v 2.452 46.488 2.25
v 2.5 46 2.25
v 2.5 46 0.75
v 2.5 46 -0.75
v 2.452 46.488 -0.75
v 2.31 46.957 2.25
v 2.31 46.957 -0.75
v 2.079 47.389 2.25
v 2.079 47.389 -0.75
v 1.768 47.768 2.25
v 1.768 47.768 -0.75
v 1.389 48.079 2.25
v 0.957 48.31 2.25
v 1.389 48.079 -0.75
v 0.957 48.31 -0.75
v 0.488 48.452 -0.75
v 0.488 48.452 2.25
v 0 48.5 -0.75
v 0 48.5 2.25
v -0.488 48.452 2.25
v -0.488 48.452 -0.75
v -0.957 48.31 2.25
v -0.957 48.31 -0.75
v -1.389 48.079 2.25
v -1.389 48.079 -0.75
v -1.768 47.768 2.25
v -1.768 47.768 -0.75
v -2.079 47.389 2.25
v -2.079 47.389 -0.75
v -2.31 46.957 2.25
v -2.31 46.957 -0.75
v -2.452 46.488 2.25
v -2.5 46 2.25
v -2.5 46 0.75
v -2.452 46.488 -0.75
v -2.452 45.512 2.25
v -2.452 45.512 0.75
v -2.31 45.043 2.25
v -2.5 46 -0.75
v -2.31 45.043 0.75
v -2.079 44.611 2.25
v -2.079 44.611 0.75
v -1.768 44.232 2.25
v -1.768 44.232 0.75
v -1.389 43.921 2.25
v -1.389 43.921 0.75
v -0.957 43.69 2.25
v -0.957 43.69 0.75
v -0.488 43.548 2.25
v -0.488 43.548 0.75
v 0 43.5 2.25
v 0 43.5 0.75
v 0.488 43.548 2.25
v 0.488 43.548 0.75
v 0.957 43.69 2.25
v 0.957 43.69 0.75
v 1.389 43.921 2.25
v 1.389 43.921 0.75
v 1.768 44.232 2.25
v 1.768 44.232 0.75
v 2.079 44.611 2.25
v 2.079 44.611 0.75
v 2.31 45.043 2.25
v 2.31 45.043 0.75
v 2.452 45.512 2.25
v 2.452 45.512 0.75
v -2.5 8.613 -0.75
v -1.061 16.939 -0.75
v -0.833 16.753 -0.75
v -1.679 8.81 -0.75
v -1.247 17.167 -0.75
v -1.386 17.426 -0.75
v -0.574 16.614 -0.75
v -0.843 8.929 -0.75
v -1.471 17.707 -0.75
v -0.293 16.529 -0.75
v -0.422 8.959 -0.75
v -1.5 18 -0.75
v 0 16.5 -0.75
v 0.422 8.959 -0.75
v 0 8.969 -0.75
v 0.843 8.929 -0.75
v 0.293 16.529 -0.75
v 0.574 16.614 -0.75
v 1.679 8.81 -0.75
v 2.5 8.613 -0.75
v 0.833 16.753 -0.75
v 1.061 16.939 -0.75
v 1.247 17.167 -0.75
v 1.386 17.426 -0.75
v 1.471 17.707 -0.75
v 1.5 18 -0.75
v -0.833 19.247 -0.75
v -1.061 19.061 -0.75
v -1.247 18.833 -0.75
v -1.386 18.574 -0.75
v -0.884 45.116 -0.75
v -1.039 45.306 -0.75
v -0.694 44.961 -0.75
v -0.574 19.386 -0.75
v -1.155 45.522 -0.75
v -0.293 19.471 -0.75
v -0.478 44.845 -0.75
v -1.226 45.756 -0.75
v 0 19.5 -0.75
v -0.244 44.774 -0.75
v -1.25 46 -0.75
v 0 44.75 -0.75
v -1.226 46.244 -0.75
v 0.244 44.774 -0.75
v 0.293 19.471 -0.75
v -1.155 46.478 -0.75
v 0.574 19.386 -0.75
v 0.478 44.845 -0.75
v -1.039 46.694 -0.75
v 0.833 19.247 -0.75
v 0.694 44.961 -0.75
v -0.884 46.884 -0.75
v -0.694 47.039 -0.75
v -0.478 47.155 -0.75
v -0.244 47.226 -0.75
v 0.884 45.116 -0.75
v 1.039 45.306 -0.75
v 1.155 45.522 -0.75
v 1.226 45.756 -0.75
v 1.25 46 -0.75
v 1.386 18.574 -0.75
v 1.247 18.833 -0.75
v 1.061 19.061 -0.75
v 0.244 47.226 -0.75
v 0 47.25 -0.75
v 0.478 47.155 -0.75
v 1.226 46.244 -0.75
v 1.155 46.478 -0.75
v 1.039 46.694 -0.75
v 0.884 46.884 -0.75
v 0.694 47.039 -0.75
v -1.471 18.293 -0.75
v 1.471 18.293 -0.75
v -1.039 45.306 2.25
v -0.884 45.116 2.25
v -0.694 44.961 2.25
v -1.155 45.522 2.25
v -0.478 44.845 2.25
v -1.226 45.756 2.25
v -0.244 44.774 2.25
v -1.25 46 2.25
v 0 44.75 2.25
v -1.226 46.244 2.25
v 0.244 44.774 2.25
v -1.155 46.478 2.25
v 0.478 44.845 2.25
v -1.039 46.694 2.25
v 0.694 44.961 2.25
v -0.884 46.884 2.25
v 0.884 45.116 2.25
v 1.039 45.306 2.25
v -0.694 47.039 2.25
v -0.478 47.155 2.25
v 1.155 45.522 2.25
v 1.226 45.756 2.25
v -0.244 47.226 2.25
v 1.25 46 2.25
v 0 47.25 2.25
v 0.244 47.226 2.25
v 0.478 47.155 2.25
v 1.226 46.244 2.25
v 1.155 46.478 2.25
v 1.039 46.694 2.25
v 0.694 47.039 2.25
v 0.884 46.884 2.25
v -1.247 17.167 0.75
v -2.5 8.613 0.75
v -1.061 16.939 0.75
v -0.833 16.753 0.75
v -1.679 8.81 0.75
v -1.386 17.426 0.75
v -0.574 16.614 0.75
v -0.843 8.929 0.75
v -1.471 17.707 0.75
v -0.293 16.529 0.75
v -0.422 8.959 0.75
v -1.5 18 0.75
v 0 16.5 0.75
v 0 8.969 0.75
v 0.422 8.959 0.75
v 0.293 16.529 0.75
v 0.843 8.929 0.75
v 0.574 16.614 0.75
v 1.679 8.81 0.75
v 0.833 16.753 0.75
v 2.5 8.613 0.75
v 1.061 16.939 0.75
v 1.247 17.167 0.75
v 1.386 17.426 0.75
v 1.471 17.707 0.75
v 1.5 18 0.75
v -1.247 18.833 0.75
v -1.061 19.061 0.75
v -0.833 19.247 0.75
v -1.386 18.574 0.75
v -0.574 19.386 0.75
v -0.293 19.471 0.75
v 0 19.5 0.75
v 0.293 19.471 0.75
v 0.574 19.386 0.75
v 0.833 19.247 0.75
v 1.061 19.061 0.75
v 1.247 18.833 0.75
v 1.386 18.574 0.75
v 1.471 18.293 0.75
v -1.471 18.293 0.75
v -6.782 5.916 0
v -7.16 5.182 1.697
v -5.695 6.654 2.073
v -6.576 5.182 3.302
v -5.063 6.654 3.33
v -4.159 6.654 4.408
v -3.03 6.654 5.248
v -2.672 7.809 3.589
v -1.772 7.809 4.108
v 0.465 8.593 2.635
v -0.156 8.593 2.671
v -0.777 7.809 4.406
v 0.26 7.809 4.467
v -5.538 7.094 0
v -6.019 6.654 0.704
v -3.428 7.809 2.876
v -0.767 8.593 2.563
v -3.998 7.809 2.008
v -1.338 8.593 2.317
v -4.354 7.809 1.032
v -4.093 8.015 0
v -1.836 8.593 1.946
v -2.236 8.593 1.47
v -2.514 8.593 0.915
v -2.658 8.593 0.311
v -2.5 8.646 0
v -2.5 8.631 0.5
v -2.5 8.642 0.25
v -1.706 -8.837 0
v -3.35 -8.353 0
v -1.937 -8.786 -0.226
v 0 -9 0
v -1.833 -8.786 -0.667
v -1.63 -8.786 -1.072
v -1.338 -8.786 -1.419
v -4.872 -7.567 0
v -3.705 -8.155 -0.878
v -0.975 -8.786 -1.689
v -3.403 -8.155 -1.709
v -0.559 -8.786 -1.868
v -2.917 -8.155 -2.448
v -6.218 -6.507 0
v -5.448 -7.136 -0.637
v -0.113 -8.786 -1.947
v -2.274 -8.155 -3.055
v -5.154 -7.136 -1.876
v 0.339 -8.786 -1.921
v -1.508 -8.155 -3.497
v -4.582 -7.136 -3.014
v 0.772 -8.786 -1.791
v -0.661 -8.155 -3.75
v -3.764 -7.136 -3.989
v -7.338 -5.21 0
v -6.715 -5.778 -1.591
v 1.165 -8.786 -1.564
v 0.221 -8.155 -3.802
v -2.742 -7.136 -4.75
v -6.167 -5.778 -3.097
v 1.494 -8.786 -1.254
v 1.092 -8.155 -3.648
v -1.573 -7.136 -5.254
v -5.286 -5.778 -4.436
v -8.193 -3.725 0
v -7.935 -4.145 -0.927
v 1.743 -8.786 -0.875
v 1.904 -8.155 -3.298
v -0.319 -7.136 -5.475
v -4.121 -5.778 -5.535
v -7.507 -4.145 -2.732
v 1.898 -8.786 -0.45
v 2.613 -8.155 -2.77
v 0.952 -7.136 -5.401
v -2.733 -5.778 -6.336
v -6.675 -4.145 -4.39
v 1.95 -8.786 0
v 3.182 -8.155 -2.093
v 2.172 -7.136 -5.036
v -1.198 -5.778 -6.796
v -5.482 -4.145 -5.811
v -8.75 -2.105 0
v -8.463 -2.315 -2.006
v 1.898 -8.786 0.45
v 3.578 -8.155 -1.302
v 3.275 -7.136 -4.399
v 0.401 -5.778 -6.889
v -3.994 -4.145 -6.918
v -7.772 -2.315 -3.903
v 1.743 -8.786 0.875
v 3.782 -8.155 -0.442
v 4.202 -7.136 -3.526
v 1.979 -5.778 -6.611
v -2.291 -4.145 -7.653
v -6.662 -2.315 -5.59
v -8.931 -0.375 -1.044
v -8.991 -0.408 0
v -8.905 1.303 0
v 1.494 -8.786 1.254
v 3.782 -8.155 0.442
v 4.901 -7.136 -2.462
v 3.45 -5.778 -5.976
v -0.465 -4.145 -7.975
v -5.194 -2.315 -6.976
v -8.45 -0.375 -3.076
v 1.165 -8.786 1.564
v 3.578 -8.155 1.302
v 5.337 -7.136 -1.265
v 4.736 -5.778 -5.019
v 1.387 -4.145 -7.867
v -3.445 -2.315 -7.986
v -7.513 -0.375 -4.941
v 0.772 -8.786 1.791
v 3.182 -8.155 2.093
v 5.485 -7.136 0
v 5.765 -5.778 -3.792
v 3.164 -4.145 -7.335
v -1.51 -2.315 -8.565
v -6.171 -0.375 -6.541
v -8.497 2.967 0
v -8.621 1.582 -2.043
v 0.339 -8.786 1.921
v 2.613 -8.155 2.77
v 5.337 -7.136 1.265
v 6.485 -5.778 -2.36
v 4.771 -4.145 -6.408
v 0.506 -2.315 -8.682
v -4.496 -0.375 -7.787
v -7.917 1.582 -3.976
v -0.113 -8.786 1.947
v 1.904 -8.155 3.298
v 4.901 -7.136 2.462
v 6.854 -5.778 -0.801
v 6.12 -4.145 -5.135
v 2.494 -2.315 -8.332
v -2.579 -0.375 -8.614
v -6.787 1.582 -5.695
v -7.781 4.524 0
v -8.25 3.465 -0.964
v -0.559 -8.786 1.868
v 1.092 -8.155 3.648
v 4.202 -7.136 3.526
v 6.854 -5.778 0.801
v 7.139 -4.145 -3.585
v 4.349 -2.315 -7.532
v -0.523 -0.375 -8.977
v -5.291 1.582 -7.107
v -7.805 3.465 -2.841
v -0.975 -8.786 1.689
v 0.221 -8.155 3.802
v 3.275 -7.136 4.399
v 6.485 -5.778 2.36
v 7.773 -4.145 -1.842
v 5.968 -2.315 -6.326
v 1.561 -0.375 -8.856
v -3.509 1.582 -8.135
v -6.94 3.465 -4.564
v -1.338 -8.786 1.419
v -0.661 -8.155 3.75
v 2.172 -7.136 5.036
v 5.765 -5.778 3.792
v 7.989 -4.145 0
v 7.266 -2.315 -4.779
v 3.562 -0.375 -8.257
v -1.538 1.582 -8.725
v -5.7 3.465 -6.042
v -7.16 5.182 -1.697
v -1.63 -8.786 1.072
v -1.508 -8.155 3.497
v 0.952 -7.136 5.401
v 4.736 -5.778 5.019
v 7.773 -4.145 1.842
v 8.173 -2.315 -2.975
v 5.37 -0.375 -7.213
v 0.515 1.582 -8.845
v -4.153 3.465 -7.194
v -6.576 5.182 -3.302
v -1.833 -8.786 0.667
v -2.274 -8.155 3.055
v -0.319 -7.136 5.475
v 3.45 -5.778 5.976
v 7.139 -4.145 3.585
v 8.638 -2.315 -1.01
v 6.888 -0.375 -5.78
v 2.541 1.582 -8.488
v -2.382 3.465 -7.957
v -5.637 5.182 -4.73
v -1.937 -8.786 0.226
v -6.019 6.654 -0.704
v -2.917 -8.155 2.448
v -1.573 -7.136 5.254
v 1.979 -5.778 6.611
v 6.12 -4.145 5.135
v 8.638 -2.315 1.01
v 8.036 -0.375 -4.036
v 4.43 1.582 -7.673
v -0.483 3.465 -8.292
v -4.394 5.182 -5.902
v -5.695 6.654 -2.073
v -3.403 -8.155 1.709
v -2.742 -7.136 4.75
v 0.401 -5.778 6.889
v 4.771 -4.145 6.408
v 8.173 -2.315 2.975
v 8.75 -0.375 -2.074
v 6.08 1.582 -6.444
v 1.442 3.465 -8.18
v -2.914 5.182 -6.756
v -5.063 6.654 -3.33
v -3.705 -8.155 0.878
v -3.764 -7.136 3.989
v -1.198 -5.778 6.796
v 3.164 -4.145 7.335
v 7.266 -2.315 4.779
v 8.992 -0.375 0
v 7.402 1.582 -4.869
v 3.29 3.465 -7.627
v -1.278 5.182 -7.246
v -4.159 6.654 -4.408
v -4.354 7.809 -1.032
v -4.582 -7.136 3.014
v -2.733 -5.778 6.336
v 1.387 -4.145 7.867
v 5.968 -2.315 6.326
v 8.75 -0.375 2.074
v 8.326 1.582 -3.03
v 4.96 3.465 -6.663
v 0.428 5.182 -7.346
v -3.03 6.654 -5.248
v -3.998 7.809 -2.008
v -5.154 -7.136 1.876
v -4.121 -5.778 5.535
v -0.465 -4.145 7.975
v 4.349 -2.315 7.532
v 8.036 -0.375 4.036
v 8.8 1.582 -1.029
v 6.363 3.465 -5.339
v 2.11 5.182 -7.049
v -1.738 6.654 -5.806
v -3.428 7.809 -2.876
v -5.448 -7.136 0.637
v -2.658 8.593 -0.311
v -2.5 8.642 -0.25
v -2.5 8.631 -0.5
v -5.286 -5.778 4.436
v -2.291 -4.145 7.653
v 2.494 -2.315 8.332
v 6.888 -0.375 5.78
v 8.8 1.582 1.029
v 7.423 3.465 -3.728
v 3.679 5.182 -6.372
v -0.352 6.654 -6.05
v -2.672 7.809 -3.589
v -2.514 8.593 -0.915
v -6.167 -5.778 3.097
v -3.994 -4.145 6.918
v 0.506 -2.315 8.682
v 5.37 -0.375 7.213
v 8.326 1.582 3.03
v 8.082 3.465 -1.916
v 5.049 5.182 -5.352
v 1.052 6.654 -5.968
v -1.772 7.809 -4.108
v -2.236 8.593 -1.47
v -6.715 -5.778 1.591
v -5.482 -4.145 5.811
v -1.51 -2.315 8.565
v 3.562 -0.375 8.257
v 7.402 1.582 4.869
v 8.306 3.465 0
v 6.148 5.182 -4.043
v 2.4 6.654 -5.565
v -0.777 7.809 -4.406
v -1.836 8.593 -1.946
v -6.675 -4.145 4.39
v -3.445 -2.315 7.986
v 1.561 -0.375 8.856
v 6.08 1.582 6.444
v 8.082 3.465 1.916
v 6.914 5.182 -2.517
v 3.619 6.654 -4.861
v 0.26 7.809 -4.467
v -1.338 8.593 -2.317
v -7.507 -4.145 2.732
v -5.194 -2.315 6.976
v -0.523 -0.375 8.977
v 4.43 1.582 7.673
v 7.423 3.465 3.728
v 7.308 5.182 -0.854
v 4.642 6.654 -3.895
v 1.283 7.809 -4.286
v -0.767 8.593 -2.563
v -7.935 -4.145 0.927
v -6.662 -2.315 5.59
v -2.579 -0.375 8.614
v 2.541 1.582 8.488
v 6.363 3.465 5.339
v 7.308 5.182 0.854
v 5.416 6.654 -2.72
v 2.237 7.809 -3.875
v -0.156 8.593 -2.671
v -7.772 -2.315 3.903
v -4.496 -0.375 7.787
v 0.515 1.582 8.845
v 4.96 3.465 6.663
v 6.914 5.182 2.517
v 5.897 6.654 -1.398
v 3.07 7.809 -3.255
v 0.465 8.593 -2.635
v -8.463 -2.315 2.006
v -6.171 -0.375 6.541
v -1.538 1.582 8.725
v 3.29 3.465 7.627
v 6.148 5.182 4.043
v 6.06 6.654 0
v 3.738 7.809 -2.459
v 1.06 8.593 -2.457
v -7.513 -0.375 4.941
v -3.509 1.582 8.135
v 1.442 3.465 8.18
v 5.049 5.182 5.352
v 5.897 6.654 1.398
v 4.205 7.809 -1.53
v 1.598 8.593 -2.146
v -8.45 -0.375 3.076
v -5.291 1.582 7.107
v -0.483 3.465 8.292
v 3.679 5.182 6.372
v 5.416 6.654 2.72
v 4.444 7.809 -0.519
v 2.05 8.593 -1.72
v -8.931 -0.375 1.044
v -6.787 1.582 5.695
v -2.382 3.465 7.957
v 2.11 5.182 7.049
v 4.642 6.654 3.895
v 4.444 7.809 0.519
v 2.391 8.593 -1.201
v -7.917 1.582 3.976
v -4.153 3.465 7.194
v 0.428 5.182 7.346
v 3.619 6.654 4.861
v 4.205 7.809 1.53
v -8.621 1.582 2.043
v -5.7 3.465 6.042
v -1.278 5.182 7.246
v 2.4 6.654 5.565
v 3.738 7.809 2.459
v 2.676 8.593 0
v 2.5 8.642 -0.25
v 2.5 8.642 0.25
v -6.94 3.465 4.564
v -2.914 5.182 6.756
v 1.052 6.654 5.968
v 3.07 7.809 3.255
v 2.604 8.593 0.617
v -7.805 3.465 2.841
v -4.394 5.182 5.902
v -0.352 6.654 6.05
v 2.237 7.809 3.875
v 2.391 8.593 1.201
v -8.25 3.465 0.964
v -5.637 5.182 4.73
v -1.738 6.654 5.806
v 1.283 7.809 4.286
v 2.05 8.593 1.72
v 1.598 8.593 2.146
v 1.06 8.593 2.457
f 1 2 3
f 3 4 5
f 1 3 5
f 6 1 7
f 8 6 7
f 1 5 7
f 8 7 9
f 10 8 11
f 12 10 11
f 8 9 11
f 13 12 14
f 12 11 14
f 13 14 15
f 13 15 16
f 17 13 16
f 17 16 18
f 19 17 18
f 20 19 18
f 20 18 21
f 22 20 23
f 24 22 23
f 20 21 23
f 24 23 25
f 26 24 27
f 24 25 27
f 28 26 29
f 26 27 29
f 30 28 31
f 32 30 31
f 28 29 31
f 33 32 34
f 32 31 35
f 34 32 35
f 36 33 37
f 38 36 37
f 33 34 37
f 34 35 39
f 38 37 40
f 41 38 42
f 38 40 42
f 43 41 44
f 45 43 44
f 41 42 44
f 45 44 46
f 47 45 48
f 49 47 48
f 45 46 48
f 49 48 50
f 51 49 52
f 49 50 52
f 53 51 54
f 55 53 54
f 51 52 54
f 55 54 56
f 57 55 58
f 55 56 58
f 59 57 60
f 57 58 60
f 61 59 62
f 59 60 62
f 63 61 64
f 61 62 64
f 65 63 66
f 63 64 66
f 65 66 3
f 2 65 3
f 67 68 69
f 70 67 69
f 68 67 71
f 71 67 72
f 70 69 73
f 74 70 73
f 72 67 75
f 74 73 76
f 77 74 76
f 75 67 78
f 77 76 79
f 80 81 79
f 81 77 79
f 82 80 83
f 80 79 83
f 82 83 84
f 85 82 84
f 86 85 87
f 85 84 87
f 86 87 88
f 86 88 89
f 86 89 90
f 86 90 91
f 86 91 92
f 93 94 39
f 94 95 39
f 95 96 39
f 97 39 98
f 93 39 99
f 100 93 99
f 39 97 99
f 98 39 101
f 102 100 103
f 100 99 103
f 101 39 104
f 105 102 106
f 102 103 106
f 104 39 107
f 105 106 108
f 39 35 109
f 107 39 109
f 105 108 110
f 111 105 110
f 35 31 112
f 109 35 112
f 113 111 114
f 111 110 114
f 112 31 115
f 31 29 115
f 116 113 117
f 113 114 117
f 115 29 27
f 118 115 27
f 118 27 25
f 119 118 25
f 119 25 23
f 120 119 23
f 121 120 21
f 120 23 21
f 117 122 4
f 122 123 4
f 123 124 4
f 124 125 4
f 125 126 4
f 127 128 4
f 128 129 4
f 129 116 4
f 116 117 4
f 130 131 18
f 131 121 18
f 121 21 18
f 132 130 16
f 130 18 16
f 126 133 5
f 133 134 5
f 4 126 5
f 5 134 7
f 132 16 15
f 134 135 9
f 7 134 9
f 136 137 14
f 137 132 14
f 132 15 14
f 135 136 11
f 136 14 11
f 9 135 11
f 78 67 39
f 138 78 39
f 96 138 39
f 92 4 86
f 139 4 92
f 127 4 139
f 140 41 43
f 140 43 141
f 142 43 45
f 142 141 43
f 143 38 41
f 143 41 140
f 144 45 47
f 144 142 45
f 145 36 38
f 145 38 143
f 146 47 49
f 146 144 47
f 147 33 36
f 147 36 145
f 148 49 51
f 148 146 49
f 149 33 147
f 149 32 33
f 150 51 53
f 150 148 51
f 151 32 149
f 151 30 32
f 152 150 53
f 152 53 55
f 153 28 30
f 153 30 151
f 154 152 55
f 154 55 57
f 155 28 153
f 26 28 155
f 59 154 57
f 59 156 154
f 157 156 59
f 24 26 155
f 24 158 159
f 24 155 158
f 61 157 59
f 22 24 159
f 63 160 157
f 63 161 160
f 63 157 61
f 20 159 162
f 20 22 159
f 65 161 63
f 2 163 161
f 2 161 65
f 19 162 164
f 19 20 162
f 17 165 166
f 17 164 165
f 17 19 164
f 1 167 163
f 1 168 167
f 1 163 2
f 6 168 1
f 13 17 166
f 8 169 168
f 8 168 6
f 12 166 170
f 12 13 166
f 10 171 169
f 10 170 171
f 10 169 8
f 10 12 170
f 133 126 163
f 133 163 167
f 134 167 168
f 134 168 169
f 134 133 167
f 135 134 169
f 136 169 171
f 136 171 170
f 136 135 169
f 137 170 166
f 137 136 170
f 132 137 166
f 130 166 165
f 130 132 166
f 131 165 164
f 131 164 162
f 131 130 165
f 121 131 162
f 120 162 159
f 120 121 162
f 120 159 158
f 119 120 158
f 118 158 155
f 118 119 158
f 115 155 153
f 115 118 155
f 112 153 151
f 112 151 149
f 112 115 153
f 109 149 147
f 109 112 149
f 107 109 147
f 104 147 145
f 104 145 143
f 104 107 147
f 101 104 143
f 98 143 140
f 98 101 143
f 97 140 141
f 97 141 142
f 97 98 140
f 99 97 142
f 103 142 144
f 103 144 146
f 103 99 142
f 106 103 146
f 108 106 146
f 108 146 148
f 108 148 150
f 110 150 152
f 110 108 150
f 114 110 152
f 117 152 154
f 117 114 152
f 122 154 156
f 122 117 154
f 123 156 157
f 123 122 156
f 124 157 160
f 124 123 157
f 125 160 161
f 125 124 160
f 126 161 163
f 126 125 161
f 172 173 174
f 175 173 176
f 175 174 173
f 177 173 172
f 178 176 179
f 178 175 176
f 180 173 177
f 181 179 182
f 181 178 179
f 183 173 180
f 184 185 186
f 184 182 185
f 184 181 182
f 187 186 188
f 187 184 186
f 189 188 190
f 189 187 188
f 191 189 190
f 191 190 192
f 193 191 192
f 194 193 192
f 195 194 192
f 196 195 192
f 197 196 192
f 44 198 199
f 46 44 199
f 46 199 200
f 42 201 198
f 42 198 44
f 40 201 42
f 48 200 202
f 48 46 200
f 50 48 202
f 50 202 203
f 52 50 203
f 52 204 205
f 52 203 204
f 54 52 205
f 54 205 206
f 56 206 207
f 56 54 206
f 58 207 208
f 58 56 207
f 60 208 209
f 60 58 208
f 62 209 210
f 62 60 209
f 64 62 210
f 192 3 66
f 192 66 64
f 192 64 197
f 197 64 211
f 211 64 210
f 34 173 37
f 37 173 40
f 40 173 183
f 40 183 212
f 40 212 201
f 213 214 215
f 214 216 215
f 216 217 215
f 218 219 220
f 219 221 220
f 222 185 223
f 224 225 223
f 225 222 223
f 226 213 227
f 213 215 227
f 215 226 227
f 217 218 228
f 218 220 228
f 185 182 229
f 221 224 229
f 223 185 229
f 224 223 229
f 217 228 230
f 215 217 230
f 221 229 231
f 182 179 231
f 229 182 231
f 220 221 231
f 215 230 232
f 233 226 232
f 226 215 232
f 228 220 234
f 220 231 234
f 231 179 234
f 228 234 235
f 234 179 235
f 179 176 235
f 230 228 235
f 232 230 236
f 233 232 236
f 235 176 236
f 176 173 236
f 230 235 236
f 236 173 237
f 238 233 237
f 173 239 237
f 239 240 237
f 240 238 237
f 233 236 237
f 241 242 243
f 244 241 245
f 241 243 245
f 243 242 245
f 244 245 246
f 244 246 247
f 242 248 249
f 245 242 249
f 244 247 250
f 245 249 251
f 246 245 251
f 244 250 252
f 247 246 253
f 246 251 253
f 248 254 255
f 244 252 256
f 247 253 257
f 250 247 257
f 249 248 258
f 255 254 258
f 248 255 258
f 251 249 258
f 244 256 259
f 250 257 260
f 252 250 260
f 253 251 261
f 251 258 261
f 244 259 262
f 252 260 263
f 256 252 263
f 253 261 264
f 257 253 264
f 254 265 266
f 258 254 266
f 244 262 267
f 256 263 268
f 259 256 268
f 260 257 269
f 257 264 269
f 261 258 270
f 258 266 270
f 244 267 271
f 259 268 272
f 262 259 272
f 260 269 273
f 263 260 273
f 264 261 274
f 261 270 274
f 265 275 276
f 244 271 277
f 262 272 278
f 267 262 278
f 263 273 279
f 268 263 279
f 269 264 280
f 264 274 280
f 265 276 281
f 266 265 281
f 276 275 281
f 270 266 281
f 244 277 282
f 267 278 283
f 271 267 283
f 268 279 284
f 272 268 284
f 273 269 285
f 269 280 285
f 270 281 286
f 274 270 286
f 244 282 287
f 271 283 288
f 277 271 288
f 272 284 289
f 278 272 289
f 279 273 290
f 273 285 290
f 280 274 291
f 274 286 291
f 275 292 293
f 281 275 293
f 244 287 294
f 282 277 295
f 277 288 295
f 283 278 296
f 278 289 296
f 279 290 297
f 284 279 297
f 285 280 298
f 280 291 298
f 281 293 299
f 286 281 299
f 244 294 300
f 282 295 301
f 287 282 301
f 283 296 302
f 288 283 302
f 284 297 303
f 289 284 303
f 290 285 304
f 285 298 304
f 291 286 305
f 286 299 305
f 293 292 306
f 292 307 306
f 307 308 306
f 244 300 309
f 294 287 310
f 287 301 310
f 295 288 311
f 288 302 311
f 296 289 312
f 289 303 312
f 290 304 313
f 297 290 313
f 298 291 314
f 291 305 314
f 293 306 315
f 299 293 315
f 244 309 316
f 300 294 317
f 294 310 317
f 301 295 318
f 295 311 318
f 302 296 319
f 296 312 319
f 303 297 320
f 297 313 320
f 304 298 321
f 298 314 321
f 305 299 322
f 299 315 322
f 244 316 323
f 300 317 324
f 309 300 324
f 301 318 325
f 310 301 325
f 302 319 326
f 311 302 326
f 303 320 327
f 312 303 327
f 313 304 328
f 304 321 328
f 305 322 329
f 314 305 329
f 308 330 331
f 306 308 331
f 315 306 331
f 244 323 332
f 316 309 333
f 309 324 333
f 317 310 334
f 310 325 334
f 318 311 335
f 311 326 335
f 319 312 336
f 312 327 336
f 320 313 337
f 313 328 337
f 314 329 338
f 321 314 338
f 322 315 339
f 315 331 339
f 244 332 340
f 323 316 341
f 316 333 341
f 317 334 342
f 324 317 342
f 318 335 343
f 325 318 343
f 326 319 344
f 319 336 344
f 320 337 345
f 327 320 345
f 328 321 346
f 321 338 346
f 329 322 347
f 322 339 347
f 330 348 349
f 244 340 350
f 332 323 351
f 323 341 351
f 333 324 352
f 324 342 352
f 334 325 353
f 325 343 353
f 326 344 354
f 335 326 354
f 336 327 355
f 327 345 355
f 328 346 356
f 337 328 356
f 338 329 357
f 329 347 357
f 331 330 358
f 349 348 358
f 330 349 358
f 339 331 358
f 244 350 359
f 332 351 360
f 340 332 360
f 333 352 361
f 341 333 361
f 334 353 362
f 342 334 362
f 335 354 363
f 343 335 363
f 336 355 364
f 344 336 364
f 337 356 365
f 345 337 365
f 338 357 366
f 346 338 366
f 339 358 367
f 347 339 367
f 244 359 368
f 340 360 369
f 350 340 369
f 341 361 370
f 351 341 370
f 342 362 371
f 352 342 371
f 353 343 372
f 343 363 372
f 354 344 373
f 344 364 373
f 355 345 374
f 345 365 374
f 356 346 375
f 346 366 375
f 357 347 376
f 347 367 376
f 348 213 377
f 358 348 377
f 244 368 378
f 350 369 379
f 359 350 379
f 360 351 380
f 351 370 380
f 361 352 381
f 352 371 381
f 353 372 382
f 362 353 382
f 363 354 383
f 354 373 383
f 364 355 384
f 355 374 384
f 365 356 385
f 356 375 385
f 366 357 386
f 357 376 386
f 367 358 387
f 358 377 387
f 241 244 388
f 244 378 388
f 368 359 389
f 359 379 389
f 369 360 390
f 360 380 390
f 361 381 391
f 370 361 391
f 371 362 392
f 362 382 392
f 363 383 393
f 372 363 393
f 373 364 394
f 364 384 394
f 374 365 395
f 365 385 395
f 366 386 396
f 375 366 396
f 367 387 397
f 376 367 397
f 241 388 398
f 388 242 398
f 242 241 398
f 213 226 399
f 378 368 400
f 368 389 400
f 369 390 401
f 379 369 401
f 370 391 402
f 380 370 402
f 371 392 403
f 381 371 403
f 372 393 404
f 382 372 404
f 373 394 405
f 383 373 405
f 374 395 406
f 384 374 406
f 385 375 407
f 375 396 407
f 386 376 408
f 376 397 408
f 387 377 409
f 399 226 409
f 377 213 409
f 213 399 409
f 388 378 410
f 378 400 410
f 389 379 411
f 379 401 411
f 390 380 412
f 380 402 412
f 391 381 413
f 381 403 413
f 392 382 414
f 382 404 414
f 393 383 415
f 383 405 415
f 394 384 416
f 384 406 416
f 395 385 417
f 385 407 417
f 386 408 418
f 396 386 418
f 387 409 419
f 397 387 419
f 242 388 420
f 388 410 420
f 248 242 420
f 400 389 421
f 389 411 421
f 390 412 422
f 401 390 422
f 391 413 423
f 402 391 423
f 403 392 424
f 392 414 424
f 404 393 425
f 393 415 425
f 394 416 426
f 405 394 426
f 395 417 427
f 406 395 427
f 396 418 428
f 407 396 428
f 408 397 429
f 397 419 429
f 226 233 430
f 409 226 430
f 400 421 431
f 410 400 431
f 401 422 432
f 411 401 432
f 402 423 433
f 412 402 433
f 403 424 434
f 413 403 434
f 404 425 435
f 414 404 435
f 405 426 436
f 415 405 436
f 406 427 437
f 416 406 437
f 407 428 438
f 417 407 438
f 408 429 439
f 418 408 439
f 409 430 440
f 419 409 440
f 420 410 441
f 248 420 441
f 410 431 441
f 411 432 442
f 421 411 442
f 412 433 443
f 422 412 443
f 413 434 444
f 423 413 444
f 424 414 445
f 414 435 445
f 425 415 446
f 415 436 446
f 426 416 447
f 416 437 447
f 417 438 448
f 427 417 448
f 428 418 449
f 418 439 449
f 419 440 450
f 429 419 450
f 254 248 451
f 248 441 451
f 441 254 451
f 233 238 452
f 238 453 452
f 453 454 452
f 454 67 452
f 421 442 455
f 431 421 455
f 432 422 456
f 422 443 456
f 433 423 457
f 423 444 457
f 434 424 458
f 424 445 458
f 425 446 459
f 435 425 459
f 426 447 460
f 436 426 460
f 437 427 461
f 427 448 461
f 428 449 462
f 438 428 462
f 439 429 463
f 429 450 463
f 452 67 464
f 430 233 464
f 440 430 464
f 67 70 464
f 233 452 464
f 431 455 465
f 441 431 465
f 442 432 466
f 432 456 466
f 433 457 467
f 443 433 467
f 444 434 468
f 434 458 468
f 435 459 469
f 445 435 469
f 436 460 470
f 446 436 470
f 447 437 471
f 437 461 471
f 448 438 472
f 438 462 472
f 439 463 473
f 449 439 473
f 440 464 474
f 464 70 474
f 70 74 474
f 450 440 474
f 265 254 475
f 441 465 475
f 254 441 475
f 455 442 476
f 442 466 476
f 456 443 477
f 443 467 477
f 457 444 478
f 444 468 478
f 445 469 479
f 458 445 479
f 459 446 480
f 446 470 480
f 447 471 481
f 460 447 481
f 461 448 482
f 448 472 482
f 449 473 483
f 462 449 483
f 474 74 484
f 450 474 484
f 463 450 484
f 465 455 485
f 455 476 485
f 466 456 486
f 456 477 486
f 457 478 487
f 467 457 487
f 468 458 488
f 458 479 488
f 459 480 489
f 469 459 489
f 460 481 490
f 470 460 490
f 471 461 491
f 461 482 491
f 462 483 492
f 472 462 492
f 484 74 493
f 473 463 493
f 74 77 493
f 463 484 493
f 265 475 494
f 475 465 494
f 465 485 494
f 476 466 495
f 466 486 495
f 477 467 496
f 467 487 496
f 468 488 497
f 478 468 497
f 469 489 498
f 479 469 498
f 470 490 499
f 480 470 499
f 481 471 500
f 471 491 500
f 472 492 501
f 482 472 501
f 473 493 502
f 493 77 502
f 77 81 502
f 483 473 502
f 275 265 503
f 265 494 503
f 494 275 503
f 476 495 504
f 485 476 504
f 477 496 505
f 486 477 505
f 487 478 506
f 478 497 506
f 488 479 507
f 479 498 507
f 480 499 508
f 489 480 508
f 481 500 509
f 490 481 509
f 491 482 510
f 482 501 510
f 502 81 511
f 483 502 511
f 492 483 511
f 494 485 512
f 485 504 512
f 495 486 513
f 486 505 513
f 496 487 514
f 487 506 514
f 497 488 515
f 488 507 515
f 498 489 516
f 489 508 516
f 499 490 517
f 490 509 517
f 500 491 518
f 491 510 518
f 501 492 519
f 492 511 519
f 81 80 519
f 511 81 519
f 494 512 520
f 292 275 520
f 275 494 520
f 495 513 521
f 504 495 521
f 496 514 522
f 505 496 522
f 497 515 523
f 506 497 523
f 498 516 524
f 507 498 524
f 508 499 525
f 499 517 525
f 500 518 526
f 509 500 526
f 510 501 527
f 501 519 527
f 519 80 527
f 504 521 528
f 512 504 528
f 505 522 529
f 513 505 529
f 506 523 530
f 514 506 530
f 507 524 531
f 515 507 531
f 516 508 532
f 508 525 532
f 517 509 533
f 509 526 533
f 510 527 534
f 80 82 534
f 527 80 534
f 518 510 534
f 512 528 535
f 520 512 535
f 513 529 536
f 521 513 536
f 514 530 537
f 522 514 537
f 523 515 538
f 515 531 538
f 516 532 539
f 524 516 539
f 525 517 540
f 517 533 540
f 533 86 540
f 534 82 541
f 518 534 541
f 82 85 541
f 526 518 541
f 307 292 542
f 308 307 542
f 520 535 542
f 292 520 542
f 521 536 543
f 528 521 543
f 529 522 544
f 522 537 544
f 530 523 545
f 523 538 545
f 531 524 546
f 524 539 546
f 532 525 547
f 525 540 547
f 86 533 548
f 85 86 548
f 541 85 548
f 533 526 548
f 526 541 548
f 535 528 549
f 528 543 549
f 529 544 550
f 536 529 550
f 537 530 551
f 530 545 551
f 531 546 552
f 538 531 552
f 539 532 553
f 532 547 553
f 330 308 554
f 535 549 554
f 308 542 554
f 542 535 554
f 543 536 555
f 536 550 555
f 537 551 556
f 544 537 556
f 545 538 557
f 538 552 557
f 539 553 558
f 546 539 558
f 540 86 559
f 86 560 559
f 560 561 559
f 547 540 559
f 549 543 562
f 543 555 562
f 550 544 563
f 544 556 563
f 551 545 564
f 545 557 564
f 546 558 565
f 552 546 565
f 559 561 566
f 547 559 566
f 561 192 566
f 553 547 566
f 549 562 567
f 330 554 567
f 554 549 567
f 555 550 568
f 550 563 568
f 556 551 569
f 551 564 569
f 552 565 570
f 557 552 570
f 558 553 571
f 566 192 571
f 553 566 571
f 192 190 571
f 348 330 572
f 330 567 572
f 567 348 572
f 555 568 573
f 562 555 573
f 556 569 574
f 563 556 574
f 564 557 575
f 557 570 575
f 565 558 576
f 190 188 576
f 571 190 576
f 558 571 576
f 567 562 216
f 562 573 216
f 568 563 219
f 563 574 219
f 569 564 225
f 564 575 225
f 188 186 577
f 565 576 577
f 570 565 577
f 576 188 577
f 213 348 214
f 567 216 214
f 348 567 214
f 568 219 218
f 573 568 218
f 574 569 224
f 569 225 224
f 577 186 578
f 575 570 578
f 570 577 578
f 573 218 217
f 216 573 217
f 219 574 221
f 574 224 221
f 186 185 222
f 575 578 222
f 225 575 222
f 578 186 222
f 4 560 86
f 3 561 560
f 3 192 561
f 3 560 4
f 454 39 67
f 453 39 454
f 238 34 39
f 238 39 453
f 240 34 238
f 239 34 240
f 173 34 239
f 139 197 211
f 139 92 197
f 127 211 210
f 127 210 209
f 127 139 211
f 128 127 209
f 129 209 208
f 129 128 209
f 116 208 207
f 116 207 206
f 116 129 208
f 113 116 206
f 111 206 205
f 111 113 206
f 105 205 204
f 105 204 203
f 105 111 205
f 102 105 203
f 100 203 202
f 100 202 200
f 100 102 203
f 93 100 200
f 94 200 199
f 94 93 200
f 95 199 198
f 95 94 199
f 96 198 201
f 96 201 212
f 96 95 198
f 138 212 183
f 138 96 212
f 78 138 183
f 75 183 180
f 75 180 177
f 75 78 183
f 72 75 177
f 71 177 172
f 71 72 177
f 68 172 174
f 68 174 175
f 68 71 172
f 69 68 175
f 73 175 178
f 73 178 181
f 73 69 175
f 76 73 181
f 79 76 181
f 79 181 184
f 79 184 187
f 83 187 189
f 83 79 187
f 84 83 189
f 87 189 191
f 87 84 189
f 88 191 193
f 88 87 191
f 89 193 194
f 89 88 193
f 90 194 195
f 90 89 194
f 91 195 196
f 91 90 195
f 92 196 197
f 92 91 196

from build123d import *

# Parameters (mm, degrees)
SKETCH2_R                = 1.5
BOSS_EXTRUDE1_DEPTH      = 0.75
BOSS_EXTRUDE2_DEPTH      = 2.25
BOSS_EXTRUDE2_DEPTH_BACK = 0.75
SKETCH2_3_R              = 1.25


with BuildPart() as part:
    # Sketch1 → Revolve1 (revolve)
    with BuildSketch(Plane.XY):
        with BuildLine():
            Line((0, 9), (0, -9))
            ThreePointArc((0, -9), (-9, 0), (0, 9))
        make_face()
    revolve(axis=Axis((0, 9, 0), (0, -1, 0)))

    # Sketch2 → Boss-Extrude1 (add, symmetric)
    with BuildSketch(Plane.XY):
        with BuildLine():
            Line((2.5, 8.645808233), (2.5, 46))
            ThreePointArc((2.5, 46), (0, 43.5), (-2.5, 46))
            Line((-2.5, 46), (-2.5, 8.645808233))
            Line((-2.5, 8.645808233), (-2.5, 6.974093444))
            Line((-2.5, 6.974093444), (2.5, 6.974093444))
            Line((2.5, 6.974093444), (2.5, 8.645808233))
        make_face()
        with Locations((0, 18)):
            Circle(SKETCH2_R, mode=Mode.SUBTRACT)
    extrude(amount=BOSS_EXTRUDE1_DEPTH, both=True)

    # Sketch2<3> → Boss-Extrude2 (add, two sides: drawn at the far end of the back side and taken through both)
    with BuildSketch(Plane.XY.offset(-BOSS_EXTRUDE2_DEPTH_BACK)):
        with BuildLine():
            ThreePointArc((-2.5, 46), (0, 43.5), (2.5, 46))
            ThreePointArc((2.5, 46), (0, 48.5), (-2.5, 46))
        make_face()
        with Locations((0, 46)):
            Circle(SKETCH2_3_R, mode=Mode.SUBTRACT)
    extrude(amount=BOSS_EXTRUDE2_DEPTH + BOSS_EXTRUDE2_DEPTH_BACK)


solid = part.part
